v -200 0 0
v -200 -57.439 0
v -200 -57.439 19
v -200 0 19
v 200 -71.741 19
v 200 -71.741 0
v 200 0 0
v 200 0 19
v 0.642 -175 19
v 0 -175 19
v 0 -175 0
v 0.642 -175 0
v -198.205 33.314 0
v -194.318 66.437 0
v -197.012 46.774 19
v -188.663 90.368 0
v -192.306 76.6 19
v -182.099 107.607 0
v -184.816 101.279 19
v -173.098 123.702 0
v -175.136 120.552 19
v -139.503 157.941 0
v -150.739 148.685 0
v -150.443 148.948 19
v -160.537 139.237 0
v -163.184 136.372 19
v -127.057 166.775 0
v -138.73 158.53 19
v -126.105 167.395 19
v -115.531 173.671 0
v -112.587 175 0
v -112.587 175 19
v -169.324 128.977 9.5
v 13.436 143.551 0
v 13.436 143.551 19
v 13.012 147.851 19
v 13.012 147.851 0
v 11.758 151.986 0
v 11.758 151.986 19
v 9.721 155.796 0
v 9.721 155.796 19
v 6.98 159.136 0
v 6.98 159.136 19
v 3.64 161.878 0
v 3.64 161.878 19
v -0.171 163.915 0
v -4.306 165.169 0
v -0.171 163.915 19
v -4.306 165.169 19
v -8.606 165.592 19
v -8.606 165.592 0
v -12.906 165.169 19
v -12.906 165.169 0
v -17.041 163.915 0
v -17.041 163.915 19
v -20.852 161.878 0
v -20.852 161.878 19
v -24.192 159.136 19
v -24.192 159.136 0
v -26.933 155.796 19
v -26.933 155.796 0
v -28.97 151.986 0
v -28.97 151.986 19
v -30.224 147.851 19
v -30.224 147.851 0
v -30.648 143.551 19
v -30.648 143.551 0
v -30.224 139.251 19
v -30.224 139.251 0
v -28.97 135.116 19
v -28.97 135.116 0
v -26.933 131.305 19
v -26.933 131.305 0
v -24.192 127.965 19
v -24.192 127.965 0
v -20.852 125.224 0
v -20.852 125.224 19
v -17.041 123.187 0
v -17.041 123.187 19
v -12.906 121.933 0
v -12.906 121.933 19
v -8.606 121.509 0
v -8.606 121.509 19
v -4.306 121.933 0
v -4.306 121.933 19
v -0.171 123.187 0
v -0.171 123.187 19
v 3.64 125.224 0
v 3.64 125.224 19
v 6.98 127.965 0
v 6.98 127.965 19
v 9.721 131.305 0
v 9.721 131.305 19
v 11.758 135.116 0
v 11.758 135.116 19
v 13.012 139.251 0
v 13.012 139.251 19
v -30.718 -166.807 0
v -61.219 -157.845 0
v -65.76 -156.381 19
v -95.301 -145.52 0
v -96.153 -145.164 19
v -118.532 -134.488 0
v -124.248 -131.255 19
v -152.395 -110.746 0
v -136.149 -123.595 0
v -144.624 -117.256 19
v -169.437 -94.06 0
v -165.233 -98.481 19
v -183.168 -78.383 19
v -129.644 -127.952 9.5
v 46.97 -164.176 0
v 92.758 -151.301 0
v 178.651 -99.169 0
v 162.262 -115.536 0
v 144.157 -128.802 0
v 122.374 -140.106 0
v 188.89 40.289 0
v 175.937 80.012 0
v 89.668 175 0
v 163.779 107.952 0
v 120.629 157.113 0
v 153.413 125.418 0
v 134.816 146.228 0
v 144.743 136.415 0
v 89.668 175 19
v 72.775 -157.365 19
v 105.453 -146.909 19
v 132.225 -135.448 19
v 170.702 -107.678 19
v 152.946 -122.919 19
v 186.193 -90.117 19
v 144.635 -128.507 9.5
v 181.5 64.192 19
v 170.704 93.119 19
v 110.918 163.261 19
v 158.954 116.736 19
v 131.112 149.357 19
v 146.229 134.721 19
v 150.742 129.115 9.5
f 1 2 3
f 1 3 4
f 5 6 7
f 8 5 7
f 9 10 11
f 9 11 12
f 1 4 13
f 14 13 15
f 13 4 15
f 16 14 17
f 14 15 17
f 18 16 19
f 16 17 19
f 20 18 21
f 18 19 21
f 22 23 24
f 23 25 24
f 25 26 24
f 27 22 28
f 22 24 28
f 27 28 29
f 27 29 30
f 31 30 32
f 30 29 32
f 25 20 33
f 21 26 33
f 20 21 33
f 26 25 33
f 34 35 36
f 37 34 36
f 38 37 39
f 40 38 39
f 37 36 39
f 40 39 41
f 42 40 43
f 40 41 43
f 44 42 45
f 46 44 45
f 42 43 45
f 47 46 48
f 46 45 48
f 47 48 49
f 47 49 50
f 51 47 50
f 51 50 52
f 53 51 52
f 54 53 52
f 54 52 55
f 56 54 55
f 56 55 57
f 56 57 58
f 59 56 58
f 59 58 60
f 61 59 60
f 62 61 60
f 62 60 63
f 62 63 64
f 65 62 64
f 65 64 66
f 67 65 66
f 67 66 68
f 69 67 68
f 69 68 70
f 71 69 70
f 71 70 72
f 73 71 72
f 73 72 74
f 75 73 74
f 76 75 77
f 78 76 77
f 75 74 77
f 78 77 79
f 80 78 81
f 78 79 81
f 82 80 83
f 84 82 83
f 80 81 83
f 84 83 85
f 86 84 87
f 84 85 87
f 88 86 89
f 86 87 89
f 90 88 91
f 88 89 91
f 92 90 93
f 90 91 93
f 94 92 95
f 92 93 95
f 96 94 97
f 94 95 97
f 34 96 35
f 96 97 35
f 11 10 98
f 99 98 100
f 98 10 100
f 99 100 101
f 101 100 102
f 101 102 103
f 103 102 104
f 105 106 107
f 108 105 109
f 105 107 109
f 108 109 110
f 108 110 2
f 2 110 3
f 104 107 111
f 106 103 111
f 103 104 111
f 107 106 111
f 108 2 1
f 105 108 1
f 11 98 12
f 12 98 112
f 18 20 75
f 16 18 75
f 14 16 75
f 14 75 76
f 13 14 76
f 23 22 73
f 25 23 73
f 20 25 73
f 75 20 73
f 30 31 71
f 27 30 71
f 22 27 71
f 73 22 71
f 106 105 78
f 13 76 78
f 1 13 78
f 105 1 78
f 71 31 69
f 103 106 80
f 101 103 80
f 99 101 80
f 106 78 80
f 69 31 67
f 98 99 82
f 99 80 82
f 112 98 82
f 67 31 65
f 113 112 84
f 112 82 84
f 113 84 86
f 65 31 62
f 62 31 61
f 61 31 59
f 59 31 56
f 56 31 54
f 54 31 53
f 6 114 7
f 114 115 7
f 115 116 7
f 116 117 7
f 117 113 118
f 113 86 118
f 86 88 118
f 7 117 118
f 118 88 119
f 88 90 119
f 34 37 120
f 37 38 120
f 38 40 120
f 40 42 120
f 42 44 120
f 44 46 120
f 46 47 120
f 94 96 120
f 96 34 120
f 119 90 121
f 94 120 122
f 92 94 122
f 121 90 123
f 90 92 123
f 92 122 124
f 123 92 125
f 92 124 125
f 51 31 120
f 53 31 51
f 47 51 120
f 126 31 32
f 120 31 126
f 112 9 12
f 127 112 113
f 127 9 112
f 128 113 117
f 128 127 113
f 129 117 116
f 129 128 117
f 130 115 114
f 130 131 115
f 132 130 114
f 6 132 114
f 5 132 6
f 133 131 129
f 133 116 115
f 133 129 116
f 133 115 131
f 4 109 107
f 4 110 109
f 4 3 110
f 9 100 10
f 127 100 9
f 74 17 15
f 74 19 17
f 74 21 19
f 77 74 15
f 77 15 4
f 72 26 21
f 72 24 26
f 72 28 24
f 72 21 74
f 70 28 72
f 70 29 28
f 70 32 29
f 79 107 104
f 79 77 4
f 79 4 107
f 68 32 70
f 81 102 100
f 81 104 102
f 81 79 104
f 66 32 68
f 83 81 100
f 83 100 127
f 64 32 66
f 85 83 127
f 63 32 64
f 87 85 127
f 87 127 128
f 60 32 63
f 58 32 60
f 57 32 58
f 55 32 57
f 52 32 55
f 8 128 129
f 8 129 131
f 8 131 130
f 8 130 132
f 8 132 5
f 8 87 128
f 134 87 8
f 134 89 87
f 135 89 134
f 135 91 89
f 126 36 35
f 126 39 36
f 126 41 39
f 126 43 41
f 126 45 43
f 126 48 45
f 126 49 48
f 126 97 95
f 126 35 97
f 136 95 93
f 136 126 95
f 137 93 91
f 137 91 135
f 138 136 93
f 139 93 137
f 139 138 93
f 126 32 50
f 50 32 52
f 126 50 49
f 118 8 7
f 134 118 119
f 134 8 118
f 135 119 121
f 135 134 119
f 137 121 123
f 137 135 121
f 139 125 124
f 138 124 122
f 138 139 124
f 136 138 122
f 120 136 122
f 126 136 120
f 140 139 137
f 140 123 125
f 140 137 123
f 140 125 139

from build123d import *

# Parameters (mm, degrees)
F0_W      = 400
F0_H      = 350
F1_DEPTH  = 19
F3_DEPTH  = 19.001
F5_DEPTH  = 19.0010001
F8_DEPTH  = 19.0010001
F9_R      = 22.041602622
F10_DEPTH = 19.0010001


with BuildPart() as f1:
    # F0 (on Top) → F1 (new body)
    with BuildSketch(Plane.XY):
        Rectangle(F0_W, F0_H)
    extrude(amount=F1_DEPTH)

    # F2 (on face) → F3 (cut, through all)
    with BuildSketch(Plane.XY.offset(19)):
        with BuildLine():
            Line((-200, 175), (-200, 0))
            add(Edge.make_bspline(
                [(-200, 0), (-197.9354059876, 47.0718279126), (-194.3381993041, 129.0865450701), (-116.4199550867, 173.9492192316), (-112.5868335366, 175)],
                knots=[0, 0, 0, 0, 0.5533709859, 0.9641555662, 0.9641555662, 0.9641555662, 0.9641555662], degree=3))
            Line((-112.5868335366, 175), (-200, 175))
        make_face()
    extrude(amount=-F3_DEPTH, mode=Mode.SUBTRACT)

    # F4 (on face) → F5 (cut, through all)
    with BuildSketch(Plane.XY.offset(19)):
        with BuildLine():
            add(Edge.make_bspline(
                [(200, 0), (186.7244970993, 49.4813033152), (163.5787269472, 135.7516978857), (111.7638804337, 163.2665740198), (89.6679908037, 175)],
                knots=[0, 0, 0, 0, 0.5735606469, 1, 1, 1, 1], degree=3))
            Line((200, 0), (200, 175))
            Line((200, 175), (89.6679908037, 175))
        make_face()
    extrude(amount=-F5_DEPTH, mode=Mode.SUBTRACT)

    # F6 (on face) + F7 (on face) → F8 (cut, through all)
    with BuildSketch(Plane.XY.offset(19)):
        with BuildLine():
            Line((-200, -175), (0, -175))
            add(Edge.make_bspline(
                [(0, -175), (-47.4363116832, -162.5537951207), (-135.1863297266, -139.5301943393), (-179.5970382425, -83.2807067772), (-200, -57.4388280511)],
                knots=[0, 0, 0, 0, 0.5405846374, 1, 1, 1, 1], degree=3))
            Line((-200, -57.4388280511), (-200, -175))
        make_face()
    with BuildSketch(Plane.XY.offset(19)):
        with BuildLine():
            add(Edge.make_bspline(
                [(0.6422742583, -175), (55.1586444169, -162.6567958418), (148.7558794279, -141.3724859979), (184.9953796241, -92.3328411017), (200, -71.7412712825)],
                knots=[0.0022640226, 0.0022640226, 0.0022640226, 0.0022640226, 0.5787782178, 0.9934410048, 0.9934410048, 0.9934410048, 0.9934410048], degree=3))
            Line((0.6422742583, -175), (200, -175))
            Line((200, -175), (200, -71.7412712825))
        make_face()
    extrude(amount=-F8_DEPTH, mode=Mode.SUBTRACT)

    # F9 (on face) → F10 (cut, through all)
    with BuildSketch(Plane.XY.offset(19)):
        with Locations((-8.6059067398, 143.5507237911)):
            Circle(F9_R)
    extrude(amount=-F10_DEPTH, mode=Mode.SUBTRACT)


solid = f1.part
